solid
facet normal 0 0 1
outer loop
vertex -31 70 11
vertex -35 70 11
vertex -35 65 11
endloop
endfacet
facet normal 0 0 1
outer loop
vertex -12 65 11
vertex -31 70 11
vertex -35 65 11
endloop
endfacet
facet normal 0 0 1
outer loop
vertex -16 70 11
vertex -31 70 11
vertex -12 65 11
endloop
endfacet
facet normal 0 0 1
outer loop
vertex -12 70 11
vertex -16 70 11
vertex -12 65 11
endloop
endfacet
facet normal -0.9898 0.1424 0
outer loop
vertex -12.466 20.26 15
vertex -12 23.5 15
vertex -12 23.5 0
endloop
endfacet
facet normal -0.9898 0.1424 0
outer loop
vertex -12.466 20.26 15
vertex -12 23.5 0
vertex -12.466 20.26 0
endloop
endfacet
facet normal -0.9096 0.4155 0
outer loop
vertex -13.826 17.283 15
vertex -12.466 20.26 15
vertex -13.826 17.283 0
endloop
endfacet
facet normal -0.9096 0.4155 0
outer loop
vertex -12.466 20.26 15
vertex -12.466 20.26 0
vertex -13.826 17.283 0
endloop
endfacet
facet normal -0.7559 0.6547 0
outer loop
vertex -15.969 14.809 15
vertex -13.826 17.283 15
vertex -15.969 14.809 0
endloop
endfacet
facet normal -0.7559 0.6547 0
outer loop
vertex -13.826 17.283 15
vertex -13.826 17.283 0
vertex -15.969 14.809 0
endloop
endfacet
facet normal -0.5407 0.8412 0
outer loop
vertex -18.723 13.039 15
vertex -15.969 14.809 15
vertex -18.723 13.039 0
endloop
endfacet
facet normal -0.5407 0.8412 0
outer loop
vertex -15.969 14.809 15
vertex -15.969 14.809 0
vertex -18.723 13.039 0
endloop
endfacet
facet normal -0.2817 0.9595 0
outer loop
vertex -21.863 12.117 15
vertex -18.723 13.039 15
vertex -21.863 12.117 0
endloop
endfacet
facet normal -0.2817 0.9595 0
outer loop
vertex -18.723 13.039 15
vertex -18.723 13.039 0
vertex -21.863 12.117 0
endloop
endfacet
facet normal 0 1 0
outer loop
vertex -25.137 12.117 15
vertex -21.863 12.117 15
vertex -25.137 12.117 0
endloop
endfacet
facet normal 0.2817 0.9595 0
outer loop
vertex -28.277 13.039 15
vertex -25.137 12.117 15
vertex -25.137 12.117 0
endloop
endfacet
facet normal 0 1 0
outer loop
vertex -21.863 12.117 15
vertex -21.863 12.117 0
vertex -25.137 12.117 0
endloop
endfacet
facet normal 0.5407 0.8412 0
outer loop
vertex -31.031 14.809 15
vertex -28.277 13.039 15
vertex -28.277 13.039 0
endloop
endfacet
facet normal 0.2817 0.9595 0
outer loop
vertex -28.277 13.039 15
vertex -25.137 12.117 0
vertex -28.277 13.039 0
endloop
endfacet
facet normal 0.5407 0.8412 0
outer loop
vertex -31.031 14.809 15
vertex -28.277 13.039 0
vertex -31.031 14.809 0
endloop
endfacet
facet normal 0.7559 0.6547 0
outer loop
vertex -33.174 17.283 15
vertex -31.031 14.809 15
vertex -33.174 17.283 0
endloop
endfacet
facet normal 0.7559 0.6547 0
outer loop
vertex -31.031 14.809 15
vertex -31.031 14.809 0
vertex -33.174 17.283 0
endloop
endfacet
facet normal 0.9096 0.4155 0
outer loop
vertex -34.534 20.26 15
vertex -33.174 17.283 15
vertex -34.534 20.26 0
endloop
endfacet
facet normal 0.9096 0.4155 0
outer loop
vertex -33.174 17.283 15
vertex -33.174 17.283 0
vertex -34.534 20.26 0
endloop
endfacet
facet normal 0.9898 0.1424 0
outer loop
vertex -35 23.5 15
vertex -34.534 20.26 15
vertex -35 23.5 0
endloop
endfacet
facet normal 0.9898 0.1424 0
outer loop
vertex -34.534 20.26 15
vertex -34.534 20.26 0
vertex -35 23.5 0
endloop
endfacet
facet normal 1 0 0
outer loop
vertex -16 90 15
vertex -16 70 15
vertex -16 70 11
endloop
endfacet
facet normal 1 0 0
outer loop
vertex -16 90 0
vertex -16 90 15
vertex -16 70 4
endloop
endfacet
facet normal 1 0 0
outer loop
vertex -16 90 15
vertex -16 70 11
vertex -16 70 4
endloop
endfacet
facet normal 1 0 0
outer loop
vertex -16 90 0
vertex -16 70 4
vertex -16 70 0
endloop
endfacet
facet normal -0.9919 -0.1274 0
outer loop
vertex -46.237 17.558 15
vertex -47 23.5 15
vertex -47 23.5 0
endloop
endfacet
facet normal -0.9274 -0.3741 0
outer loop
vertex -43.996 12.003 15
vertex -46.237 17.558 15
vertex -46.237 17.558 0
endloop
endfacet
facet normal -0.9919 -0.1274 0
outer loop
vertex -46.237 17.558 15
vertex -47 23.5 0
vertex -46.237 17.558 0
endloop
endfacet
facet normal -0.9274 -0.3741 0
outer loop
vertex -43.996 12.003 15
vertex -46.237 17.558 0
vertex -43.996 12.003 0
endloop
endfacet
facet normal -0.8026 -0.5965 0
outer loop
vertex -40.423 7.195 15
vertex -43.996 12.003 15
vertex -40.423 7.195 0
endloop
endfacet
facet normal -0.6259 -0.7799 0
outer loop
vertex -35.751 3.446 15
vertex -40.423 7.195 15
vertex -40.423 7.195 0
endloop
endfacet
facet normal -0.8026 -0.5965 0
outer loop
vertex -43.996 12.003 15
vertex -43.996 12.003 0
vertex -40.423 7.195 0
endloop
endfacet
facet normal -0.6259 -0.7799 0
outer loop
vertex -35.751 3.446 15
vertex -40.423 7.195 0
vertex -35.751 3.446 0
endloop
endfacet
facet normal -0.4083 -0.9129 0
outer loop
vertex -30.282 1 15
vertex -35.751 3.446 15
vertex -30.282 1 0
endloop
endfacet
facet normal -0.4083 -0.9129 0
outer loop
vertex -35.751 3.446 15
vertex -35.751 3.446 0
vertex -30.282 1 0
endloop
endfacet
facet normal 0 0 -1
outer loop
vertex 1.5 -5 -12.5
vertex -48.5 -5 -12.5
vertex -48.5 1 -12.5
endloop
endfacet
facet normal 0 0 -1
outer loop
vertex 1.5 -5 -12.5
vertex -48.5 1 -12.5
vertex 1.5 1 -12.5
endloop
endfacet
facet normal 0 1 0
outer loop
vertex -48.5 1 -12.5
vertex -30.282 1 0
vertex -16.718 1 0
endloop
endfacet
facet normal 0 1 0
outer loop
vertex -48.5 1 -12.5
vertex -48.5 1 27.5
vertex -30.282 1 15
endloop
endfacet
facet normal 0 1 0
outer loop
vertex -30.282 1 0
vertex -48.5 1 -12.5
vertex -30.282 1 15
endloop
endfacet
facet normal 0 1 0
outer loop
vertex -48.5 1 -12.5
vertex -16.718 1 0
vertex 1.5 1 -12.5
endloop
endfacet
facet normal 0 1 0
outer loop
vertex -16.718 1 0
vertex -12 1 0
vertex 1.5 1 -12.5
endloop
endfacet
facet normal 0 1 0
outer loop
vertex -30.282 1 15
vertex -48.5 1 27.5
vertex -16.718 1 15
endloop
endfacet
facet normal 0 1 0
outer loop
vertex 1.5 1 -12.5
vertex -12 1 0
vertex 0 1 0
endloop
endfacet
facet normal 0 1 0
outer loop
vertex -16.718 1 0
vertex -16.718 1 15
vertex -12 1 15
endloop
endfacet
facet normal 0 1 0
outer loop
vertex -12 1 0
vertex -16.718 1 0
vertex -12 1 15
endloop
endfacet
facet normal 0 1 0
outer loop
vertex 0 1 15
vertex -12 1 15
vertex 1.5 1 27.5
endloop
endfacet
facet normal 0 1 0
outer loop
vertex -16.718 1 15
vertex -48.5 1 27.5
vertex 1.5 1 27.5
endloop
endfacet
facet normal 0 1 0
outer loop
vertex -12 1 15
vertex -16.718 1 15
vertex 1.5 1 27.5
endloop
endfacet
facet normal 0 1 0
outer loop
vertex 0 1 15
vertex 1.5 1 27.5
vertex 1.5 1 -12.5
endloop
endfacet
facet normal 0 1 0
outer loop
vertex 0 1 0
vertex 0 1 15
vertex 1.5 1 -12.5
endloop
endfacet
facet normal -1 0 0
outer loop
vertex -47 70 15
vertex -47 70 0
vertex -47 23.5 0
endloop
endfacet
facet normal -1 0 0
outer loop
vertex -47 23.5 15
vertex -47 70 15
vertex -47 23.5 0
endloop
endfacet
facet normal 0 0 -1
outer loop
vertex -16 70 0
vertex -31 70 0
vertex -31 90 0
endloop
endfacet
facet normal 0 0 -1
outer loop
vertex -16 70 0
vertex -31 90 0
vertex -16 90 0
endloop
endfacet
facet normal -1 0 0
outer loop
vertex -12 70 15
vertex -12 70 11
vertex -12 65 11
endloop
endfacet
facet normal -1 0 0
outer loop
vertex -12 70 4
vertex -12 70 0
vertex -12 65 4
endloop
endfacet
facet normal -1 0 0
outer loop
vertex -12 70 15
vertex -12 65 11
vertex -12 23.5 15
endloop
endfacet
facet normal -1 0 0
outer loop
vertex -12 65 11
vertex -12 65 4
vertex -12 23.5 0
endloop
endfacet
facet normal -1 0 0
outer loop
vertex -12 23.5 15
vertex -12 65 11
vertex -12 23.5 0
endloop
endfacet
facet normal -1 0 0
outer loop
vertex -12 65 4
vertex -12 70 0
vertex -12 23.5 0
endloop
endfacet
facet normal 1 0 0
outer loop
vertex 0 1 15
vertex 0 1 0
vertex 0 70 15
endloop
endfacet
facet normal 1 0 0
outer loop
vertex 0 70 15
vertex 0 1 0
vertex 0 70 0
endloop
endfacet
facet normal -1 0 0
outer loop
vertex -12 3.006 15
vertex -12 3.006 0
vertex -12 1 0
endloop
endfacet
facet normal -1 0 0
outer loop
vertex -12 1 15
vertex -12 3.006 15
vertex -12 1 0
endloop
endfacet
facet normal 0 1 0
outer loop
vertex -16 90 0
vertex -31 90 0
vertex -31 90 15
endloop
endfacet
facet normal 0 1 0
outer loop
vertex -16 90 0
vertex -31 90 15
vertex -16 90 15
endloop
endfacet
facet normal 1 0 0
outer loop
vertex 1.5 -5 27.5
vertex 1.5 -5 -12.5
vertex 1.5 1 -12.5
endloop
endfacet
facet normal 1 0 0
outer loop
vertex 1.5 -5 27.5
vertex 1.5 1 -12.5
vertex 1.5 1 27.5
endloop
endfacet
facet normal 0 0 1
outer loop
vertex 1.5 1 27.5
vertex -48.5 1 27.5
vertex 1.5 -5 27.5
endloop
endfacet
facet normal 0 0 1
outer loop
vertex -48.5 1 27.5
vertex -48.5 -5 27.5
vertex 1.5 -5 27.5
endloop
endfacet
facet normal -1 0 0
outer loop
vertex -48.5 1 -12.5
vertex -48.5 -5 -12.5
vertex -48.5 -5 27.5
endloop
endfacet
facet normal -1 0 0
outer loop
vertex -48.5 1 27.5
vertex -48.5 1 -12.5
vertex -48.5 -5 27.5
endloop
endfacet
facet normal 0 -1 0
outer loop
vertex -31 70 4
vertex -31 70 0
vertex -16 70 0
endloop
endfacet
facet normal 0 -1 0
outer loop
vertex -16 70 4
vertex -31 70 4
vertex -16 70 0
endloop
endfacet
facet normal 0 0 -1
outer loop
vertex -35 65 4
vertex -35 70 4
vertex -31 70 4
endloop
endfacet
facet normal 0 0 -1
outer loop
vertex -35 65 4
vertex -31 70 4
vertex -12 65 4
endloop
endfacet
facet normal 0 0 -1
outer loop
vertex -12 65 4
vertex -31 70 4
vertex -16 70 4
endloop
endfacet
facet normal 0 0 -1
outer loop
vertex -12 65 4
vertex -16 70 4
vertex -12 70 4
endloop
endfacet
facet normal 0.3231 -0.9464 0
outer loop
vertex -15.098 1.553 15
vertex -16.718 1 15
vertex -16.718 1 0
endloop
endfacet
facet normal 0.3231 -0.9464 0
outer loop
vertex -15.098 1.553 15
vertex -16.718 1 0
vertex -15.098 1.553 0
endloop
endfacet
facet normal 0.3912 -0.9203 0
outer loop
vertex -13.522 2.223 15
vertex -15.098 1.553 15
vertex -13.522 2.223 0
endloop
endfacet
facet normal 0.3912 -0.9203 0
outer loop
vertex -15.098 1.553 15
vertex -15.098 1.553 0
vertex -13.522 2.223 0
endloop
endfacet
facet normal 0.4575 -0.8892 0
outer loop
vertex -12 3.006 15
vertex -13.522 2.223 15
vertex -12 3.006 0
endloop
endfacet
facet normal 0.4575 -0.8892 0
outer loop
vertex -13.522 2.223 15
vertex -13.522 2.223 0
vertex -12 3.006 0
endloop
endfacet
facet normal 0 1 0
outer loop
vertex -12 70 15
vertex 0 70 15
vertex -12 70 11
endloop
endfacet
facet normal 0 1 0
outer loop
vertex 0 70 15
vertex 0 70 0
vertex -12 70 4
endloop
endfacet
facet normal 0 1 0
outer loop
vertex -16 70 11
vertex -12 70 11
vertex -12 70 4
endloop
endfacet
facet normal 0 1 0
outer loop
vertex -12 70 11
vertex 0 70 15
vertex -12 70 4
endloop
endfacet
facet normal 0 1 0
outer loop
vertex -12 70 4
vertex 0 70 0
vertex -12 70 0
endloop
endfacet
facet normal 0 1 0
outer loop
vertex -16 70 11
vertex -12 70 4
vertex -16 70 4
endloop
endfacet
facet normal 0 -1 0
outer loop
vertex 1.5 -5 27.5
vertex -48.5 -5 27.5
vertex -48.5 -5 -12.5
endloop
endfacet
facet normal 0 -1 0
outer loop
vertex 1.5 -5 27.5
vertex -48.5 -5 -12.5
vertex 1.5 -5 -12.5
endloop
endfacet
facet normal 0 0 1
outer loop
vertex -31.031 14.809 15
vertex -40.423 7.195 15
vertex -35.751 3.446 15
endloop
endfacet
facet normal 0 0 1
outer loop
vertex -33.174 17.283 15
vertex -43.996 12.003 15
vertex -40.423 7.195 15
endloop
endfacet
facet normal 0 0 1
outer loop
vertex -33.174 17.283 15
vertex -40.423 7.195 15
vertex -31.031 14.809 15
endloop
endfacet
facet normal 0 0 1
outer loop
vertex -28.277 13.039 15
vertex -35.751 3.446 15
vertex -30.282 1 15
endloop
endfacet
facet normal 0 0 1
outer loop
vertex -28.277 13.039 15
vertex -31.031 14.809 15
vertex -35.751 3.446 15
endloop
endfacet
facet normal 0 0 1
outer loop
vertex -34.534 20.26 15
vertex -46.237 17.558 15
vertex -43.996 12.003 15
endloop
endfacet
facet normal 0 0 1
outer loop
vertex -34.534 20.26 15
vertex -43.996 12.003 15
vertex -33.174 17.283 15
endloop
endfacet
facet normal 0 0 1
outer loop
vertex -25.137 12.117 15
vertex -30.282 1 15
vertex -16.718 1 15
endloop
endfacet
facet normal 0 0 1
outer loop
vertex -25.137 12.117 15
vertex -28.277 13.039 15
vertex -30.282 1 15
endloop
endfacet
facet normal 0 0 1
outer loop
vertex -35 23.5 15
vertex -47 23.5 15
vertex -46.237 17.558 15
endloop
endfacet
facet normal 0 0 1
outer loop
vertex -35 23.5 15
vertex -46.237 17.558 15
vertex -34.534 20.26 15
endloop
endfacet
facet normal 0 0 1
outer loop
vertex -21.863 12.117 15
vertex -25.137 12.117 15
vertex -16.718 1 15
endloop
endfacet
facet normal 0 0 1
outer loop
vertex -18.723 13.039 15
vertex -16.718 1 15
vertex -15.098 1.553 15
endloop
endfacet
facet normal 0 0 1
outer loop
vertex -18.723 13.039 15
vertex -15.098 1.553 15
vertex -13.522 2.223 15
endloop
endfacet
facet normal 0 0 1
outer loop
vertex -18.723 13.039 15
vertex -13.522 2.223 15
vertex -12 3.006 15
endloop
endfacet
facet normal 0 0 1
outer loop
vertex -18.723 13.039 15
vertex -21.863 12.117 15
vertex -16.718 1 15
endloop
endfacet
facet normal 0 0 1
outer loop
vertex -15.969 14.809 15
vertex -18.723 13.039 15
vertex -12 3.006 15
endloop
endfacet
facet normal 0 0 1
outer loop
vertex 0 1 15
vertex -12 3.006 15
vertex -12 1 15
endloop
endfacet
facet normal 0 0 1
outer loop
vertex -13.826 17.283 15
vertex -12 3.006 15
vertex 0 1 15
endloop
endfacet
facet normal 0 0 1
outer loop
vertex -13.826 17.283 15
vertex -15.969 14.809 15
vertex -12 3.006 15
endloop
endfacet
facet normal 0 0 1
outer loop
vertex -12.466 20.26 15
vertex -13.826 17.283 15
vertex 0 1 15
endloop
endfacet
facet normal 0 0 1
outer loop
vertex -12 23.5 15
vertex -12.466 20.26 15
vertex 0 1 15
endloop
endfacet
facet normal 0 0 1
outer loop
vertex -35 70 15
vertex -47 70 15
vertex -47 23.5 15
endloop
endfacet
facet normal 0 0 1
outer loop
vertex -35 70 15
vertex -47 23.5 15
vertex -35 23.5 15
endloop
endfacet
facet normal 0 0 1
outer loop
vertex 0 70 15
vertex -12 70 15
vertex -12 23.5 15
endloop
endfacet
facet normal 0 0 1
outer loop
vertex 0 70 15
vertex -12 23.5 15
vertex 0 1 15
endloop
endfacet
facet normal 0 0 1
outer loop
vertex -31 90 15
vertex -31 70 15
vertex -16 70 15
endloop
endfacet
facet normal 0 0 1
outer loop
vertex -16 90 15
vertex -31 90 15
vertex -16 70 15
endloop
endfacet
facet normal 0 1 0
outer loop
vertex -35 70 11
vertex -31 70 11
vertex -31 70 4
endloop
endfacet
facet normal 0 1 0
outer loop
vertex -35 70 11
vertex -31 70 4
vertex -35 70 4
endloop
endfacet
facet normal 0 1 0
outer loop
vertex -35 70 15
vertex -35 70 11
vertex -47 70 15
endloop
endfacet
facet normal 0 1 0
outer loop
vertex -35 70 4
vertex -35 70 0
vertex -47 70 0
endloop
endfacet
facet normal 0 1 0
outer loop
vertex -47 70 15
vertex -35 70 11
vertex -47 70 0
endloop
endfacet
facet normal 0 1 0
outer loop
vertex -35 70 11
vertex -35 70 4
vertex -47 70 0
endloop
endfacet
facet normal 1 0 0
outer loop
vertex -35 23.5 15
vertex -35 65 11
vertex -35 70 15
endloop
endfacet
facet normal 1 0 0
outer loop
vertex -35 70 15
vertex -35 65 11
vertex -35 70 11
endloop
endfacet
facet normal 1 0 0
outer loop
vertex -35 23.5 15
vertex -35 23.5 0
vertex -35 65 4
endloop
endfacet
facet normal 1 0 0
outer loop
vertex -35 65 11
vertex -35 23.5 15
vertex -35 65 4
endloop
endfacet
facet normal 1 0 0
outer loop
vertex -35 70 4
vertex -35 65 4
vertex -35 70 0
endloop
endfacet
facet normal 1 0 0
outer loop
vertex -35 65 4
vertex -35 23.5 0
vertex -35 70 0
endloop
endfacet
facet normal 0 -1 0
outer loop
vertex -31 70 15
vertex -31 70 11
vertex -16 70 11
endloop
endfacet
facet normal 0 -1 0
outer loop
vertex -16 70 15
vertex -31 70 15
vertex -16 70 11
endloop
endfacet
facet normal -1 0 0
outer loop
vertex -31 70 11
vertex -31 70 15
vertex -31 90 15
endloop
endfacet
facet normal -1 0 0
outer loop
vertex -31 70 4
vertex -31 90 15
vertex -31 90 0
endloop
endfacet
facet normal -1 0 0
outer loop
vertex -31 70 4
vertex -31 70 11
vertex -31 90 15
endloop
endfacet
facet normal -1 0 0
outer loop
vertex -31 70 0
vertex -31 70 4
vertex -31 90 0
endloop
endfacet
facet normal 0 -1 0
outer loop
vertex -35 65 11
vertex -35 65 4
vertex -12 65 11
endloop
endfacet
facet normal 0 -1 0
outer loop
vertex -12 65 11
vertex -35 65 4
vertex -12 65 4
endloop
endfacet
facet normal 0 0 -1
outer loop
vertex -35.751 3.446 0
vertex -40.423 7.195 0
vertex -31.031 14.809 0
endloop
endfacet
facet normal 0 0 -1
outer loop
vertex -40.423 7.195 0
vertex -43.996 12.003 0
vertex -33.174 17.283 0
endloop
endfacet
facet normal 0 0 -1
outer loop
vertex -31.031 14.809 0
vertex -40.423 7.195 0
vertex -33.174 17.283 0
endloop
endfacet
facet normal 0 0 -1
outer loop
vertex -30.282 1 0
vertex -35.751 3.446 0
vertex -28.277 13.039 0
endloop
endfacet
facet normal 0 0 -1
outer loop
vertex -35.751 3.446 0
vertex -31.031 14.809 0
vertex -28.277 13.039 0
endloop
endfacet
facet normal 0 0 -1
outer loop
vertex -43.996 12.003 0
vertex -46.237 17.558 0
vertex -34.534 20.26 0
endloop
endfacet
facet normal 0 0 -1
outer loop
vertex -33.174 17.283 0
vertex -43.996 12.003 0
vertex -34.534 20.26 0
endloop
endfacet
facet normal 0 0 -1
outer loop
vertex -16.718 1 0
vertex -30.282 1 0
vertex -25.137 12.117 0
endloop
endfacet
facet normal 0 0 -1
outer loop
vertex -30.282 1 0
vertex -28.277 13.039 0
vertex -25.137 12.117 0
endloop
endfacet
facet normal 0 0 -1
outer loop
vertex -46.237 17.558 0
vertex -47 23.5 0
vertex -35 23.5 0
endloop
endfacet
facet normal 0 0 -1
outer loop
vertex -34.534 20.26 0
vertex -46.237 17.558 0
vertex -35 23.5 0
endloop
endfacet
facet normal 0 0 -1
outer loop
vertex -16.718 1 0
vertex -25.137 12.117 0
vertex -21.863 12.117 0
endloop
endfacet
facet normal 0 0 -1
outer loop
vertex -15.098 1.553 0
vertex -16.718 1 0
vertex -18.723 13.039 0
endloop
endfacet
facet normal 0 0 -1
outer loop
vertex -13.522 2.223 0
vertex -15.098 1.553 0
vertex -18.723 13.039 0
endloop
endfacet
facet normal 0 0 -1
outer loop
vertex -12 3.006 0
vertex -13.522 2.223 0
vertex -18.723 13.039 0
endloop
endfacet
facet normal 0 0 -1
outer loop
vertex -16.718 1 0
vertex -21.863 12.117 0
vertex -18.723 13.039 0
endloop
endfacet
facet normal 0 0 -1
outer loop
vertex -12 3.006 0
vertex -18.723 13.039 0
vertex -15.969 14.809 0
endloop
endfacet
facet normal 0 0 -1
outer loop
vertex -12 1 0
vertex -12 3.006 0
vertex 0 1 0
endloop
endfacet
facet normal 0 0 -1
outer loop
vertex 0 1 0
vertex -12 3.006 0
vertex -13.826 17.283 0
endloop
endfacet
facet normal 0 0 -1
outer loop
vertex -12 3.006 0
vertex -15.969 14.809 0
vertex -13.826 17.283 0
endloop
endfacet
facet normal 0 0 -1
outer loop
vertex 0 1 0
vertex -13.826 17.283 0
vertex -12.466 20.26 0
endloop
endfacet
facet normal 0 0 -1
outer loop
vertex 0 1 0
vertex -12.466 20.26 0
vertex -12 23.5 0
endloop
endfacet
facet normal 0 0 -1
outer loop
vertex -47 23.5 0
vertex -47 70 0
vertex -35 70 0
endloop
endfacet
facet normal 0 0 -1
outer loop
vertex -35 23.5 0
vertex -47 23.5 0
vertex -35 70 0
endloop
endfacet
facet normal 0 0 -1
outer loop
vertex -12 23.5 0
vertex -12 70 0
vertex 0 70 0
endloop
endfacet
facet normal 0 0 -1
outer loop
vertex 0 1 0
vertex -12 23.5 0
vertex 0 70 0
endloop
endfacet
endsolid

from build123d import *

# Parameters (mm, degrees)
AUFSATZ_LINEAR_AUSTRAGEN1_DEPTH      = 15
SKIZZE2_W                            = 50
SKIZZE2_H                            = 40
AUFSATZ_LINEAR_AUSTRAGEN2_DEPTH      = 5
AUFSATZ_LINEAR_AUSTRAGEN2_DEPTH_BACK = 1
SKIZZE3_W                            = 23
SKIZZE3_H                            = 7
AUFSATZ_LINEAR_AUSTRAGEN3_DEPTH      = 5
SKIZZE4_W                            = 15
SKIZZE4_H                            = 15
AUFSATZ_LINEAR_AUSTRAGEN4_DEPTH      = 20


with BuildPart() as part:
    # Skizze1 → Aufsatz-Linear austragen1 (new body)
    with BuildSketch(Plane.XY):
        with BuildLine():
            Line((0, 0), (0, 70))
            Line((0, 70), (-12, 70))
            Line((-12, 70), (-12, 23.5))
            ThreePointArc((-12, 23.5), (-23.5, 12), (-35, 23.5))
            Line((-35, 23.5), (-35, 70))
            Line((-35, 70), (-47, 70))
            Line((-47, 70), (-47, 23.5))
            ThreePointArc((-47, 23.5), (-35.374342087, 3.220700209), (-12, 3.006098468))
            Line((-12, 3.006098468), (-12, 0))
            Line((-12, 0), (0, 0))
        make_face()
    extrude(amount=AUFSATZ_LINEAR_AUSTRAGEN1_DEPTH)

    # Skizze2 → Aufsatz-Linear austragen2 (add, two sides)
    with BuildSketch(Plane.XZ) as aufsatz_linear_austragen2_sk:
        with Locations((-23.5, 7.5)):
            Rectangle(SKIZZE2_W, SKIZZE2_H)
    extrude(amount=AUFSATZ_LINEAR_AUSTRAGEN2_DEPTH)
    extrude(aufsatz_linear_austragen2_sk.sketch, amount=-AUFSATZ_LINEAR_AUSTRAGEN2_DEPTH_BACK)

    # Skizze3 → Aufsatz-Linear austragen3 (add)
    with BuildSketch(Plane(origin=(0, 70, 0), x_dir=(1, 0, 0), z_dir=(0, 1, 0))):
        with Locations((-23.5, -7.5)):
            Rectangle(SKIZZE3_W, SKIZZE3_H)
    extrude(amount=-AUFSATZ_LINEAR_AUSTRAGEN3_DEPTH)

    # Skizze4 → Aufsatz-Linear austragen4 (add)
    with BuildSketch(Plane(origin=(0, 70, 0), x_dir=(1, 0, 0), z_dir=(0, 1, 0))):
        with Locations((-23.5, -7.5)):
            Rectangle(SKIZZE4_W, SKIZZE4_H)
    extrude(amount=AUFSATZ_LINEAR_AUSTRAGEN4_DEPTH)


solid = part.part
